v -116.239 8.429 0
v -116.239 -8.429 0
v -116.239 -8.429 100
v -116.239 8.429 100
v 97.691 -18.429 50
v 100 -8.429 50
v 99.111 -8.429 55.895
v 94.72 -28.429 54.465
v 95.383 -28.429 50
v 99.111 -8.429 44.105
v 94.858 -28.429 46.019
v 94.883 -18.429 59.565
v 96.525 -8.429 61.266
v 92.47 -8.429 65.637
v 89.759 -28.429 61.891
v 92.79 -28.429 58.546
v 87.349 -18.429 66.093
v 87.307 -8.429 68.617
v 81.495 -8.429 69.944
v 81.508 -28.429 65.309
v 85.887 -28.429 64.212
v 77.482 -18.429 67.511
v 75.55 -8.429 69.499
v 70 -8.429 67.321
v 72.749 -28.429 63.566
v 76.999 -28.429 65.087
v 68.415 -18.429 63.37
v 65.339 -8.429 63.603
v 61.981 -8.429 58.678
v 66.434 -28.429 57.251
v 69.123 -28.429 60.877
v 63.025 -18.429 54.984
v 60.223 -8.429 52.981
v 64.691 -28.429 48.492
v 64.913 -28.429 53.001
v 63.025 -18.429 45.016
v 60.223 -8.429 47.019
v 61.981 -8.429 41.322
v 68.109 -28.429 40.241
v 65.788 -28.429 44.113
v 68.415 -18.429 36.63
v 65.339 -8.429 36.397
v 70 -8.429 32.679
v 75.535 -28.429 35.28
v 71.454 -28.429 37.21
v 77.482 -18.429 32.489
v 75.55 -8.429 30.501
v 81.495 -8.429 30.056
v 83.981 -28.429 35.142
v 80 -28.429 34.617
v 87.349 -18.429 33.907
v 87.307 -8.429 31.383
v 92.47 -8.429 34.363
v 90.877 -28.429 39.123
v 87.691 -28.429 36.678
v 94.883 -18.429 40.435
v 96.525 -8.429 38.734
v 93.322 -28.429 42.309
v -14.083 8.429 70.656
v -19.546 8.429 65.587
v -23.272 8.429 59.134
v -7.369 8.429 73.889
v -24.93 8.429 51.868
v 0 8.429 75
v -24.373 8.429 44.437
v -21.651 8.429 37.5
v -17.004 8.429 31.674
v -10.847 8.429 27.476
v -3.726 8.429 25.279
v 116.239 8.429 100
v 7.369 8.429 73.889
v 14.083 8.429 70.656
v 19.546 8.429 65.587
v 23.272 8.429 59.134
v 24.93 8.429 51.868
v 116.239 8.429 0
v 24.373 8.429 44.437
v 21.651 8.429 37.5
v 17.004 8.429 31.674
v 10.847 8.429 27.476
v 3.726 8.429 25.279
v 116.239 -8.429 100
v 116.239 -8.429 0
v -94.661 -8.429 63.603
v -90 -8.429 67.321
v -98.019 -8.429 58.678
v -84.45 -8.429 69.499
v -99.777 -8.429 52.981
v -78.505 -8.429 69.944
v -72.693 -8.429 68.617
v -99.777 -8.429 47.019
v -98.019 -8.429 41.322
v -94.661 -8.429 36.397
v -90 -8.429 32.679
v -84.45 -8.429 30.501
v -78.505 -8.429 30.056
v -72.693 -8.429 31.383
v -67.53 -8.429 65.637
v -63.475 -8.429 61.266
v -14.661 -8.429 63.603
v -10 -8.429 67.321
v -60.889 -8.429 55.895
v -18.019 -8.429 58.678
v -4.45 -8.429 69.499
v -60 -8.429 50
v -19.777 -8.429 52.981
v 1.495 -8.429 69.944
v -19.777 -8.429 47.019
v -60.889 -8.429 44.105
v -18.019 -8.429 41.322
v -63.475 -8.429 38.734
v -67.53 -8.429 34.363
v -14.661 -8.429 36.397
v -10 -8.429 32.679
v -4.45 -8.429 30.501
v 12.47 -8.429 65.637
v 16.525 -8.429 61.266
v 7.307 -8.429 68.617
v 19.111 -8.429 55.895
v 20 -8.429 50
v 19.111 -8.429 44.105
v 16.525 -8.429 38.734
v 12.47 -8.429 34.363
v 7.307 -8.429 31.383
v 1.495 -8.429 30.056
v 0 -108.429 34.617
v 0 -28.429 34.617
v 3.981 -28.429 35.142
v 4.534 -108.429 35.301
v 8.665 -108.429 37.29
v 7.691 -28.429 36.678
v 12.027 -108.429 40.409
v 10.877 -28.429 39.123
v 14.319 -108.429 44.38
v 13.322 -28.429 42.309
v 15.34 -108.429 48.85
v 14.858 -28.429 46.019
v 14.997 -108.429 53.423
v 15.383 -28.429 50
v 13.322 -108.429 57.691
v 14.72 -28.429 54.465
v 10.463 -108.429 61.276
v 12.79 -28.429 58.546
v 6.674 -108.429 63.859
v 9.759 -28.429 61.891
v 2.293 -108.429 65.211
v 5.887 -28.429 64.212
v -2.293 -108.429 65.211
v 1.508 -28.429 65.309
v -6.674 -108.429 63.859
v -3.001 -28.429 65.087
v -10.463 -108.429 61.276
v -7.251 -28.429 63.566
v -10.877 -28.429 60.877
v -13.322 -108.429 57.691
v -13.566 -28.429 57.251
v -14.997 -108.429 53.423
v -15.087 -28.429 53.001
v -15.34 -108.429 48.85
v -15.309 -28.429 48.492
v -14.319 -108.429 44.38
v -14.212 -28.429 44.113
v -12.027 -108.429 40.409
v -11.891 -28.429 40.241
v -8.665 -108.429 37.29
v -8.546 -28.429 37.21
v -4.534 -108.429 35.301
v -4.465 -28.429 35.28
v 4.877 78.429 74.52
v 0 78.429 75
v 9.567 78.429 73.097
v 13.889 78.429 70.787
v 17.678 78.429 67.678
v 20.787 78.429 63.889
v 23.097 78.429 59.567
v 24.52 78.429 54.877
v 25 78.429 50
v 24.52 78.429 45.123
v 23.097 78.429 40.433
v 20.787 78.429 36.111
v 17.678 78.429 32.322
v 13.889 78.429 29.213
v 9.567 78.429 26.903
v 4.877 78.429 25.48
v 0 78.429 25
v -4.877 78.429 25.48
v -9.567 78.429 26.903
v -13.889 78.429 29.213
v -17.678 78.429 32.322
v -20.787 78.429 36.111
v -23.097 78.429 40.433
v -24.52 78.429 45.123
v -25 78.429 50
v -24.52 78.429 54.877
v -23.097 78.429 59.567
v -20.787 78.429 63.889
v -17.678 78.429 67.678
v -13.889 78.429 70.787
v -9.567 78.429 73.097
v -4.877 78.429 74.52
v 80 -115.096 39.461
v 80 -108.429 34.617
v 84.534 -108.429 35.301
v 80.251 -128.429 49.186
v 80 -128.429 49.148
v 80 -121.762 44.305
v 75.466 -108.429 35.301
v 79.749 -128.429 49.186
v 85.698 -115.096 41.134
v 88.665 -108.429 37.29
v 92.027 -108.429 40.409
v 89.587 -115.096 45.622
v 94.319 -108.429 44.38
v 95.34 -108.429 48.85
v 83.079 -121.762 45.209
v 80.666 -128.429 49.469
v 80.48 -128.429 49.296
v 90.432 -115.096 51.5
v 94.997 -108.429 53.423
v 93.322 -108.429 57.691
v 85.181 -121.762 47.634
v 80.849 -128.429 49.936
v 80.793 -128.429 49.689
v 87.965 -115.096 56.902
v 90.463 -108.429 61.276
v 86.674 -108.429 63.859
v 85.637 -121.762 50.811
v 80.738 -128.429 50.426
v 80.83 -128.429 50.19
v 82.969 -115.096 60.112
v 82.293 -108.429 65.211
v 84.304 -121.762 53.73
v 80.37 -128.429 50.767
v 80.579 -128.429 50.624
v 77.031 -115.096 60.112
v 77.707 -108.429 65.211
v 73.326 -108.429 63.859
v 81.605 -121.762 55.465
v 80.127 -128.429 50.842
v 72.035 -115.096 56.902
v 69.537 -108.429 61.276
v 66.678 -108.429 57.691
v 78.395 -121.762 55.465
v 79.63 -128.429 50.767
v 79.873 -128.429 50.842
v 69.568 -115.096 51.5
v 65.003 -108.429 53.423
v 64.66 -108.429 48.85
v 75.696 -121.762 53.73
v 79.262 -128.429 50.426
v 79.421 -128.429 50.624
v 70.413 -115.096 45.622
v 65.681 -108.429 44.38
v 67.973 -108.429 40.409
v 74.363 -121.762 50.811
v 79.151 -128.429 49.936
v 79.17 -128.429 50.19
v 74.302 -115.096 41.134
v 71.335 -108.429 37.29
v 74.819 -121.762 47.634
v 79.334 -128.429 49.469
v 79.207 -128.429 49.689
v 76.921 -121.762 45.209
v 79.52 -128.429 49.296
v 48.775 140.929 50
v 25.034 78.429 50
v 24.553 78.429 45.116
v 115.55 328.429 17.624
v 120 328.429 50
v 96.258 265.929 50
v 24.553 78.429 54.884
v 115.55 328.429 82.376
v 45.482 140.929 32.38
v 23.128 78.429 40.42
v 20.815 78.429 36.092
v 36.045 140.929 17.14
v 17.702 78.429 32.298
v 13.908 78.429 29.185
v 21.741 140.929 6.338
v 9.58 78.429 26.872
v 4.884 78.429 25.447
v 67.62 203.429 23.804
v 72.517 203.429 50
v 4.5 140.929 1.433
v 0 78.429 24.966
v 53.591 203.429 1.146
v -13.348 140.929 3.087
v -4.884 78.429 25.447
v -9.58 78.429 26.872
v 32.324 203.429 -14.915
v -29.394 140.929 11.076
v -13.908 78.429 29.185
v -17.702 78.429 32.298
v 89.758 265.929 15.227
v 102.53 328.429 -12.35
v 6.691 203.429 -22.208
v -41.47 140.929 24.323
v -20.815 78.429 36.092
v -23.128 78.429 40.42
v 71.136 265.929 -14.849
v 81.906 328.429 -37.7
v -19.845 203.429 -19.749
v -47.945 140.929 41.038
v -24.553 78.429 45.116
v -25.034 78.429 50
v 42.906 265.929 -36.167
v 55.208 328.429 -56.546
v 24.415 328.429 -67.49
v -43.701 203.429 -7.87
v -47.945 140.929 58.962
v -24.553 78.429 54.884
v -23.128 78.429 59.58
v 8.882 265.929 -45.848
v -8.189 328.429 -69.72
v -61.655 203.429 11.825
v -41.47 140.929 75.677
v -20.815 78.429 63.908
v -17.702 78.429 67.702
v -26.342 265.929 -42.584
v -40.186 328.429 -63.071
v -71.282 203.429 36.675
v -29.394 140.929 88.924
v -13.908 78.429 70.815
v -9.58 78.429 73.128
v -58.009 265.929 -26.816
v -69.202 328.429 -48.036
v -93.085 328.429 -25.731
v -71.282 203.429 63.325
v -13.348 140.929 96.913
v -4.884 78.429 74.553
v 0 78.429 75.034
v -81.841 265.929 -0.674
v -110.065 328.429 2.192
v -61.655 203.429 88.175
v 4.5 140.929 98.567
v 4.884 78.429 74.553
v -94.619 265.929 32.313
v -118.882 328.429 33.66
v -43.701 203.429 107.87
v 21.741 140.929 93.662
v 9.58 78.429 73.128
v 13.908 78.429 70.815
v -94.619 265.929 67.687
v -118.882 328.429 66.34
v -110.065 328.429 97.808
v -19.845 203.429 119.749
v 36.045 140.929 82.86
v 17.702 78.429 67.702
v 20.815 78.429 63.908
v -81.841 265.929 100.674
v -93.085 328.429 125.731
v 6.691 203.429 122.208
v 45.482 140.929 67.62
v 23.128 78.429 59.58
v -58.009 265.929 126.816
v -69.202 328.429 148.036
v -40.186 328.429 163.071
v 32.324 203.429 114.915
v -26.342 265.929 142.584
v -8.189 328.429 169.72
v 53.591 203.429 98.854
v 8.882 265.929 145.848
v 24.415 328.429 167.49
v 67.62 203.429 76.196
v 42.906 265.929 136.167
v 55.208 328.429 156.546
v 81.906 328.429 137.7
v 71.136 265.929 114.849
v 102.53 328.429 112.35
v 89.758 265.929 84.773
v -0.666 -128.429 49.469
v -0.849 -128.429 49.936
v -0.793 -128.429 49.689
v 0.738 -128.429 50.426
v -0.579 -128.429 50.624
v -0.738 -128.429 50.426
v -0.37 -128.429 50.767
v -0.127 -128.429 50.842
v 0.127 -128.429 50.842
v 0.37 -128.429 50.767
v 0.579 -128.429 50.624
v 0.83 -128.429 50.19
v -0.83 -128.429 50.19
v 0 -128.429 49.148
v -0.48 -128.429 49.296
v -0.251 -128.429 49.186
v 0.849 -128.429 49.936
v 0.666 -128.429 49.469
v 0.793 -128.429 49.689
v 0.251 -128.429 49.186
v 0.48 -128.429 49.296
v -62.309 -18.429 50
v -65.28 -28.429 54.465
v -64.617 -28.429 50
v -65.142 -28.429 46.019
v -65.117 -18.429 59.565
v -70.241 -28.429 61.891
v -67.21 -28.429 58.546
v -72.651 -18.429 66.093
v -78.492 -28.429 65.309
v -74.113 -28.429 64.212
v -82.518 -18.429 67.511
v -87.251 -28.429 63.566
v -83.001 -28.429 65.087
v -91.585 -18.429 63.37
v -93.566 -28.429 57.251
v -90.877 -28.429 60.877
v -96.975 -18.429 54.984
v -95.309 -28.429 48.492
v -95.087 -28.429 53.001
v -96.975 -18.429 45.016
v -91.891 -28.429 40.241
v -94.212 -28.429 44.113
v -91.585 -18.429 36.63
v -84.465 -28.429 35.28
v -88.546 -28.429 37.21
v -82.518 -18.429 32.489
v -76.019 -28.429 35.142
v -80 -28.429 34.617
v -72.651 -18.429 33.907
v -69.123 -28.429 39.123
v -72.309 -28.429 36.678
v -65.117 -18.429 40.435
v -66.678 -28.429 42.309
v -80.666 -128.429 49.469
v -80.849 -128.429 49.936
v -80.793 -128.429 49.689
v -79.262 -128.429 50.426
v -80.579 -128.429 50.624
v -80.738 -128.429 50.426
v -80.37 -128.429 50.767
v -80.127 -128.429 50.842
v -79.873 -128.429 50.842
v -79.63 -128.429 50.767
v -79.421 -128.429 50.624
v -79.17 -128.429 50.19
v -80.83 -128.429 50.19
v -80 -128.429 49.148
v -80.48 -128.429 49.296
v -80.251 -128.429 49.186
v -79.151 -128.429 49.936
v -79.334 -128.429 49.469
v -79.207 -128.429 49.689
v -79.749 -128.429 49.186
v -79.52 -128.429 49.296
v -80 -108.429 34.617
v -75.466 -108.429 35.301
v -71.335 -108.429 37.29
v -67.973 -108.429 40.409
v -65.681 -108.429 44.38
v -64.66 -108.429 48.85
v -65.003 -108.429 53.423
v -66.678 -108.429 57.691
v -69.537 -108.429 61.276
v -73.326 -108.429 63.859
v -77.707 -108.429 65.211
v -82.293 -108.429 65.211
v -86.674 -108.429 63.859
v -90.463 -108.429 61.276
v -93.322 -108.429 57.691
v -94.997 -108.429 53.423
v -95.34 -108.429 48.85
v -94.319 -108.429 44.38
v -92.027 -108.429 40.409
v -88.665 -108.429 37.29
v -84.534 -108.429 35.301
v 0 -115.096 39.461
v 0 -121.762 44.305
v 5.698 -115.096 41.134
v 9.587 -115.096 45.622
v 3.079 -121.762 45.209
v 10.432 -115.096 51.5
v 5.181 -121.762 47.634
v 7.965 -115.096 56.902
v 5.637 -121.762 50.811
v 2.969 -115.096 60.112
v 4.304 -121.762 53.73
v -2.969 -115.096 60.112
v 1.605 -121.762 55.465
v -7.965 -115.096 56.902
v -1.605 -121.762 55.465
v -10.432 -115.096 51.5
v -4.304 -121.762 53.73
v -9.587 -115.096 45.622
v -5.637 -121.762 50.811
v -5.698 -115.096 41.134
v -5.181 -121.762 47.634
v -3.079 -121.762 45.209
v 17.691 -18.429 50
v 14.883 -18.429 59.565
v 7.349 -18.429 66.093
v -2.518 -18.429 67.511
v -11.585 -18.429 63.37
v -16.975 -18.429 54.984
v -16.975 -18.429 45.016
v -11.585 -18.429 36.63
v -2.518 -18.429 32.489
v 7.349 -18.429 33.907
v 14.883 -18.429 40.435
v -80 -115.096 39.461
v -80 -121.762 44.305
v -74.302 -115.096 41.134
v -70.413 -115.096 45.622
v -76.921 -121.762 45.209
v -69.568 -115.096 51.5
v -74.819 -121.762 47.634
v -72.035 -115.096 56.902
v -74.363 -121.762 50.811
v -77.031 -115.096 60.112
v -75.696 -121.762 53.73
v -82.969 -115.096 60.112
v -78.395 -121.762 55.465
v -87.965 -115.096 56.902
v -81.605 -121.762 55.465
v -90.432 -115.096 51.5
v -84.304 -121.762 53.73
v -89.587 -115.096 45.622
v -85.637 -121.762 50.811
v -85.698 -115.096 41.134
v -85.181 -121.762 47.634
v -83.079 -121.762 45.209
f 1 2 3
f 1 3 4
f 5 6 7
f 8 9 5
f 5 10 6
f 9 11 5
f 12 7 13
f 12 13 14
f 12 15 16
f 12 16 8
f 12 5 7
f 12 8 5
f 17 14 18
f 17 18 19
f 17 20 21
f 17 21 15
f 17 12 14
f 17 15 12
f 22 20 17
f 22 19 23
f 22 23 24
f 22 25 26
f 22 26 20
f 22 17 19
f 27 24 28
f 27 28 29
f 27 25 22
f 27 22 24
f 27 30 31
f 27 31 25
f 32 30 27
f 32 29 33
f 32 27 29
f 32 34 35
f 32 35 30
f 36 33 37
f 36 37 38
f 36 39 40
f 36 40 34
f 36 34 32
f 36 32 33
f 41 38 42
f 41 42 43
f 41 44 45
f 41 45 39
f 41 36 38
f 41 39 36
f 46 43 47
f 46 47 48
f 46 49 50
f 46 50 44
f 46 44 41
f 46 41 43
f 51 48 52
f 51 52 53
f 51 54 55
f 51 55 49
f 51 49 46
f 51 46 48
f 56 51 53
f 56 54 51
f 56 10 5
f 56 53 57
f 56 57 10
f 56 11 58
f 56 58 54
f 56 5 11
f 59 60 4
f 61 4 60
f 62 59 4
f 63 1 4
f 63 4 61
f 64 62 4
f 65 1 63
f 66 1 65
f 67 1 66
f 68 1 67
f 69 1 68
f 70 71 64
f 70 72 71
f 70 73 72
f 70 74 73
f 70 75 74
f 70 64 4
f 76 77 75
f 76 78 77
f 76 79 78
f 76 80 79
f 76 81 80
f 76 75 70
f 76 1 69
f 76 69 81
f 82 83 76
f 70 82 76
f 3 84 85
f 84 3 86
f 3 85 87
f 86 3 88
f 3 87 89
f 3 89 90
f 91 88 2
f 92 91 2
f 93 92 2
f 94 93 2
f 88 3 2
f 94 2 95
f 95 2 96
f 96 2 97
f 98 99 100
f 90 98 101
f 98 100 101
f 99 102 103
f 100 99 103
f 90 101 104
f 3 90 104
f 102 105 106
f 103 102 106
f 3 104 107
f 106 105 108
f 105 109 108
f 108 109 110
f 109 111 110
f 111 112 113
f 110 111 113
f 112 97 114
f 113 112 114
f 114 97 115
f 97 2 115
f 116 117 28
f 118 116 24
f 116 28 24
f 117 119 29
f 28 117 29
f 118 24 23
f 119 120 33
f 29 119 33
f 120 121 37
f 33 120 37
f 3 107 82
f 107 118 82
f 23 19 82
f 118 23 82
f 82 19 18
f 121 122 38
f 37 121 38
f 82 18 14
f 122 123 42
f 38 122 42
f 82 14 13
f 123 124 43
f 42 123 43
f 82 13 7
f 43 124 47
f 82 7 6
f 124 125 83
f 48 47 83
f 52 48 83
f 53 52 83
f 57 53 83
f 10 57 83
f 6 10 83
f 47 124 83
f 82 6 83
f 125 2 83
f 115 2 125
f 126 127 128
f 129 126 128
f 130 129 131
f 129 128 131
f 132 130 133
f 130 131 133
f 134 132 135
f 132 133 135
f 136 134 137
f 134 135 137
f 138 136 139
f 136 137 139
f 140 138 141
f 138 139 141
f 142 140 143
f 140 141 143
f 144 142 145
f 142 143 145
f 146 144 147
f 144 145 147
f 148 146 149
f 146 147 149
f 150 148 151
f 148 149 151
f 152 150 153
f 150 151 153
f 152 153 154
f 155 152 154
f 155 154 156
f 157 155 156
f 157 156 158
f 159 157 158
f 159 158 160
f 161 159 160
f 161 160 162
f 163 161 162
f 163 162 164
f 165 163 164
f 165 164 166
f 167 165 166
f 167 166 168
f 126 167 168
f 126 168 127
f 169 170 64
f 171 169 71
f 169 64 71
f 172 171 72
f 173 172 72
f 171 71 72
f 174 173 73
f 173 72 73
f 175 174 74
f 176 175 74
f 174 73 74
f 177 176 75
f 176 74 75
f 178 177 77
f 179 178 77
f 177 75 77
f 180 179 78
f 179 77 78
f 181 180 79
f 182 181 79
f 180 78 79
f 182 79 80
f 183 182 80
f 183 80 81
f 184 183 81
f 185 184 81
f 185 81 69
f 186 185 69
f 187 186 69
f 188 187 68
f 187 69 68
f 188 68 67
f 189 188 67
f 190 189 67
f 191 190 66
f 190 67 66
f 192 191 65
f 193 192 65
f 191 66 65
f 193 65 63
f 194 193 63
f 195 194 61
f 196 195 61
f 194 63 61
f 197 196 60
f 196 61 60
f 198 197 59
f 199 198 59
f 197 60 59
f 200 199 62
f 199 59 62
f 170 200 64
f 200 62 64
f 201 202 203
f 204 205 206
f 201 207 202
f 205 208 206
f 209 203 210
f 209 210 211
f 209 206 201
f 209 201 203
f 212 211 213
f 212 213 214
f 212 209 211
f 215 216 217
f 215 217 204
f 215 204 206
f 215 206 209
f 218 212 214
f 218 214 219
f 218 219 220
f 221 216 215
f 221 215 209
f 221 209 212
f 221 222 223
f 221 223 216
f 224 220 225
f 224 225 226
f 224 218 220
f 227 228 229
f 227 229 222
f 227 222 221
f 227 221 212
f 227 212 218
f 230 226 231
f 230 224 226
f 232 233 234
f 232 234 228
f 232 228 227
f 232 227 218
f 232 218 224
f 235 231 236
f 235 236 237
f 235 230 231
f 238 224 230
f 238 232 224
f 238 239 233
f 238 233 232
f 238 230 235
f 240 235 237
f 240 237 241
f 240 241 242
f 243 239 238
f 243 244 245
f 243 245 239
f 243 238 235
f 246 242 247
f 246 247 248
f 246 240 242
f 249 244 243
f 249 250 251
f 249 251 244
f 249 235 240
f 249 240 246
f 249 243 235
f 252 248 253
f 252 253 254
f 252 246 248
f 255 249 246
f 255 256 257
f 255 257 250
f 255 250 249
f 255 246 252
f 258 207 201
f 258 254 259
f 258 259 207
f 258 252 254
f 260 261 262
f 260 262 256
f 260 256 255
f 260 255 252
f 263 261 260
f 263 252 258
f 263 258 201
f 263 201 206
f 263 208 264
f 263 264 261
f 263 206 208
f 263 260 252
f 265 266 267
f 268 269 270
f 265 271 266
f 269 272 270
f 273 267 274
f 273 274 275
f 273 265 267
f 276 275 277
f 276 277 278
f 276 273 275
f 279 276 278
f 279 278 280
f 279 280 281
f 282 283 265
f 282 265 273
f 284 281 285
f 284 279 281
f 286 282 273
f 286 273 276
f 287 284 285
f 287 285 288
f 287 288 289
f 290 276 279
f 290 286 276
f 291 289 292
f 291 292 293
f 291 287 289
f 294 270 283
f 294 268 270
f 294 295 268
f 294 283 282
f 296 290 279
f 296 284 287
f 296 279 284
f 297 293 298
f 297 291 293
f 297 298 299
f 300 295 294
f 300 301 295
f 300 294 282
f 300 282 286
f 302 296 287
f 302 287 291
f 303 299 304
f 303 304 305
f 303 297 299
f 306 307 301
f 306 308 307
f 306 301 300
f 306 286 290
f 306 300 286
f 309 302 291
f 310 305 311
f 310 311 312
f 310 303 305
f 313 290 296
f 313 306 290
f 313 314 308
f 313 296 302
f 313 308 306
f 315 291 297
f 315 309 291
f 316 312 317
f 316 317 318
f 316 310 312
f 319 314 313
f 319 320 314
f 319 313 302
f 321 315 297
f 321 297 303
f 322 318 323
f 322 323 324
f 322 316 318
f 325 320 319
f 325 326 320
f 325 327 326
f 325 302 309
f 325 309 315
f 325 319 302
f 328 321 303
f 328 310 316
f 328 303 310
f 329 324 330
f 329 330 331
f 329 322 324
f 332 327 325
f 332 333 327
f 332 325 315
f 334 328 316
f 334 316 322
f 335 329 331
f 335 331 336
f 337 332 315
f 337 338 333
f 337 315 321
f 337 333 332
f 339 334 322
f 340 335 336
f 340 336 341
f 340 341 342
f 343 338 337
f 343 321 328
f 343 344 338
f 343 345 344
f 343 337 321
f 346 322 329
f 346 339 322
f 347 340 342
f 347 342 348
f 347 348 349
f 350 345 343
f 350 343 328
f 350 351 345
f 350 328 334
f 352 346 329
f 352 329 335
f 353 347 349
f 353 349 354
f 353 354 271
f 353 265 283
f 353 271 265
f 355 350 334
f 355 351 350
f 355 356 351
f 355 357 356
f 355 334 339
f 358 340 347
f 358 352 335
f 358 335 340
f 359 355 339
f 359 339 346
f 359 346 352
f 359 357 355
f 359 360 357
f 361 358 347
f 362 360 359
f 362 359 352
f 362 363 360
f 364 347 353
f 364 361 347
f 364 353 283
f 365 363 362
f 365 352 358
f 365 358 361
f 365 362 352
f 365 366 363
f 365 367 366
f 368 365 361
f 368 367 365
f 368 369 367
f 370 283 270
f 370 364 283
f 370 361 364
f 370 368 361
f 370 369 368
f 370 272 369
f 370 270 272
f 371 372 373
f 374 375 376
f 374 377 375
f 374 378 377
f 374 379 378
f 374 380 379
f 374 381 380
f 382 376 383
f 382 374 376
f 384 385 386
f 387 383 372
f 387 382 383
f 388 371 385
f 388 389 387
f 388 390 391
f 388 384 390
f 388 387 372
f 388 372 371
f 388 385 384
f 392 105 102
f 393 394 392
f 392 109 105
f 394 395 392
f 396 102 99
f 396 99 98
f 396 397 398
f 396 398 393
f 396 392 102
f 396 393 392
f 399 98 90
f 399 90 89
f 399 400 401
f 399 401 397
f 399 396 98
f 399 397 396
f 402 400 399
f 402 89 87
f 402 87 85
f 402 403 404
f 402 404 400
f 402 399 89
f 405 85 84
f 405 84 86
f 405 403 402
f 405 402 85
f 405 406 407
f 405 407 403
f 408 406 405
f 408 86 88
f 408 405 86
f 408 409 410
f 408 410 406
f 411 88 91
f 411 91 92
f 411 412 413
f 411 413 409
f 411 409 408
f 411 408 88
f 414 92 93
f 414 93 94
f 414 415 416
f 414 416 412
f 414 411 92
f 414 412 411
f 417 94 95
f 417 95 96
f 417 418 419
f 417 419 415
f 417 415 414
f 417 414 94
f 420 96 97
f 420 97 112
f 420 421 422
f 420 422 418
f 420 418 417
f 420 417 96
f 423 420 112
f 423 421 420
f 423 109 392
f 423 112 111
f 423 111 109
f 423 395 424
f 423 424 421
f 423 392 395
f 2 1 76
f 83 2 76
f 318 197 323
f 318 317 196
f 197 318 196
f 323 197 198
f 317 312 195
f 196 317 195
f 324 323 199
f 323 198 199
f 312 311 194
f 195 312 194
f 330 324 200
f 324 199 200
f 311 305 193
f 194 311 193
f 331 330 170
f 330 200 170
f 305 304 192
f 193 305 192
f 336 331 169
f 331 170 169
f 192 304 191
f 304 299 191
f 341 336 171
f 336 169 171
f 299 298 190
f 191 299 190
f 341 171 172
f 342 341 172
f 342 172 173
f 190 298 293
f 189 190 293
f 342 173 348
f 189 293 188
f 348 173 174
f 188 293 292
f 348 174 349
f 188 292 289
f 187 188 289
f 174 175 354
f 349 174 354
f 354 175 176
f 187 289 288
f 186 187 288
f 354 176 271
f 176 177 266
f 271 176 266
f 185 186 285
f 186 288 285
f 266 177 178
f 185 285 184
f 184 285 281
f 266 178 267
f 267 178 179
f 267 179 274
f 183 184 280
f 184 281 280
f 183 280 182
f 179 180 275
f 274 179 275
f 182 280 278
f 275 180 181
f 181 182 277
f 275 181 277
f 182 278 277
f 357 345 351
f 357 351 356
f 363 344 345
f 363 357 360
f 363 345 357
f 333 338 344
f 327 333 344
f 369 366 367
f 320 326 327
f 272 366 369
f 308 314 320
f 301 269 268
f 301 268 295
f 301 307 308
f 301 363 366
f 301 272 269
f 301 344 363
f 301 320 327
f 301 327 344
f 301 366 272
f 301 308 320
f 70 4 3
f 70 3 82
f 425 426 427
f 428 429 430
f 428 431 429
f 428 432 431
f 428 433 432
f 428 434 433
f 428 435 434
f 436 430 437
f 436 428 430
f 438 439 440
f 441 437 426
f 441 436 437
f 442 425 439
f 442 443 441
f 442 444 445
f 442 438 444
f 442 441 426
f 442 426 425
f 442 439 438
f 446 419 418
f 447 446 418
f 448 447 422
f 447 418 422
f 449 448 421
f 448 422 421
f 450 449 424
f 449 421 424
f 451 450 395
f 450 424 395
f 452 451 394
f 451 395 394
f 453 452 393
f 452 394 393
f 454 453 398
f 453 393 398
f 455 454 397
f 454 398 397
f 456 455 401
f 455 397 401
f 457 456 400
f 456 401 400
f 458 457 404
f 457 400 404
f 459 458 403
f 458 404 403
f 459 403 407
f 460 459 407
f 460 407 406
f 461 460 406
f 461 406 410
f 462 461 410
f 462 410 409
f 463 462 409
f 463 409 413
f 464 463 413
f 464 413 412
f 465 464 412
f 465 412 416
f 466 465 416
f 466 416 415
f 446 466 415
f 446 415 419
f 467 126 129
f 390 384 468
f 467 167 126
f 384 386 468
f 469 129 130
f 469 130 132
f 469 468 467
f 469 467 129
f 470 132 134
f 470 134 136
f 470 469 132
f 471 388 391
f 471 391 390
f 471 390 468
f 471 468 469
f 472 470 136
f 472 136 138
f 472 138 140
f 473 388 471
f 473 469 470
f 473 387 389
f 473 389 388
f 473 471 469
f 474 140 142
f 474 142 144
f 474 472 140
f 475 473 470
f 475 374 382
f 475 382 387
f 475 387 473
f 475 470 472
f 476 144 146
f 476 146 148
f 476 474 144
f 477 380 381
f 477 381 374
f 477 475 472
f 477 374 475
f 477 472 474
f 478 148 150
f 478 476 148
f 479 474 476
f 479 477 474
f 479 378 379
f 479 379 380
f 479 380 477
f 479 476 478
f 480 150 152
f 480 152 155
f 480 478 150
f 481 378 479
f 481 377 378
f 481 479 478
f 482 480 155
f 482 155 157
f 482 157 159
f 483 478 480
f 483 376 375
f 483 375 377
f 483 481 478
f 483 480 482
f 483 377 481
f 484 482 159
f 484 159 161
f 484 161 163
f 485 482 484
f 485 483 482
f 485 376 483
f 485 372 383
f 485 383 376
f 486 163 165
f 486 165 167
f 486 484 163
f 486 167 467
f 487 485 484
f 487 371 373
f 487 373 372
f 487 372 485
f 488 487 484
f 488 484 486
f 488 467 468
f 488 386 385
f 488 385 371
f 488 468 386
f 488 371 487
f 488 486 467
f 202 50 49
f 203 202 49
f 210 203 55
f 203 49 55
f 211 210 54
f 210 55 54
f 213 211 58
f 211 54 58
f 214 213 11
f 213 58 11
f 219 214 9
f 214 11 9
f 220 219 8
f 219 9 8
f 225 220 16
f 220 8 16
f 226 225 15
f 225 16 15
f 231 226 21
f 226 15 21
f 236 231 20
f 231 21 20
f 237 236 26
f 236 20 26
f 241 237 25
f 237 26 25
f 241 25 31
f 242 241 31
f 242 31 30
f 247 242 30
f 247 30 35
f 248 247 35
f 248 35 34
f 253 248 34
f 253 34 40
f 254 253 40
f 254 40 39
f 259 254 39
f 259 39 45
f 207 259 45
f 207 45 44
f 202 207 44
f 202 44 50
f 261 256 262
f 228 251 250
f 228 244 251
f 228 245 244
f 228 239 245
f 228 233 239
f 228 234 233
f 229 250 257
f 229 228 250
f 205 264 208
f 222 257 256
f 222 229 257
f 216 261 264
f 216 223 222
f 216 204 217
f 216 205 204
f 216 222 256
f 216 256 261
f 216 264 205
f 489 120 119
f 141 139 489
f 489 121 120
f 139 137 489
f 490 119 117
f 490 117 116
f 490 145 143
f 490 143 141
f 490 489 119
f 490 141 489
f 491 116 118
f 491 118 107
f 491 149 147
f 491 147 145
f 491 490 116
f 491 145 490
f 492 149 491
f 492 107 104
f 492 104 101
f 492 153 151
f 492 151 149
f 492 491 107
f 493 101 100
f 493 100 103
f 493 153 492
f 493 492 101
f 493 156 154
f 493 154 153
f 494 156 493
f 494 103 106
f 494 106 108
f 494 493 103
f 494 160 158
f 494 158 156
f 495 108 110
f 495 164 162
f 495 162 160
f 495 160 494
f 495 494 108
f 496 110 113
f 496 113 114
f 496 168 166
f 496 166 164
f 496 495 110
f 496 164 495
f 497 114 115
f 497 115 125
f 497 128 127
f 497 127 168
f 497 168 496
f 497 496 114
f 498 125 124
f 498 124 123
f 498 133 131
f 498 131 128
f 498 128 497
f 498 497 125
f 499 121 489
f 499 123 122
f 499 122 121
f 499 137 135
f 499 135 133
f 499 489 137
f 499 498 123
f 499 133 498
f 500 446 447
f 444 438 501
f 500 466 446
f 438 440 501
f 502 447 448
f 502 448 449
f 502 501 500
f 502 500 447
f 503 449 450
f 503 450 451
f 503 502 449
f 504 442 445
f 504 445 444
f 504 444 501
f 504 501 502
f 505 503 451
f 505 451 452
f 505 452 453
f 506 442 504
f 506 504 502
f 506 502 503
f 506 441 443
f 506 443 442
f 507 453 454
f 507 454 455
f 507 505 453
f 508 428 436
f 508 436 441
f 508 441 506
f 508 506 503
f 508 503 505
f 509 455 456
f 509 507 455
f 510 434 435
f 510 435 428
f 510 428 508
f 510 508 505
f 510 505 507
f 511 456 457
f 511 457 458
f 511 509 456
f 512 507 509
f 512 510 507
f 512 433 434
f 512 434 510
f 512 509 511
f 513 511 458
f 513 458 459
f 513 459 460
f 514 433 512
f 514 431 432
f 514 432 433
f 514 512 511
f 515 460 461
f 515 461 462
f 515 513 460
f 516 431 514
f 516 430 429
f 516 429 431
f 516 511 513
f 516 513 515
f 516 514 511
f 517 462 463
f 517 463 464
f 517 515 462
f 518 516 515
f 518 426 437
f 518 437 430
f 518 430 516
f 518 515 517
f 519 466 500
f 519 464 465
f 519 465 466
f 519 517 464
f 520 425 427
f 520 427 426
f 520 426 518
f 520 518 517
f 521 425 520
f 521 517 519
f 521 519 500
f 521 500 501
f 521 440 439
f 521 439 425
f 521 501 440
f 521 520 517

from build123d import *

# Parameters (mm, degrees)
SKETCH1_W           = 232.477284974
SKETCH1_H           = 16.858001952
BOSS_EXTRUDE1_DEPTH = 100
SKETCH2_R           = 25
BOSS_EXTRUDE2_DEPTH = 70
SKETCH5_R           = 20
BOSS_EXTRUDE3_DEPTH = 20
BOSS_EXTRUDE3_TAPER = 13
SKETCH6_R           = 15.382636177
BOSS_EXTRUDE4_DEPTH = 80
SKETCH7_R           = 15.382636177
BOSS_EXTRUDE5_DEPTH = 20
BOSS_EXTRUDE5_TAPER = 36
LPATTERN1_COUNT     = 2
LPATTERN1_PITCH     = 80
LPATTERN2_COUNT     = 2
LPATTERN2_PITCH     = 80
SKETCH9_R           = 120
BOSS_EXTRUDE6_DEPTH = 250
BOSS_EXTRUDE6_DRAFT = -20.8


with BuildPart() as part:
    # Sketch1 → Boss-Extrude1 (new body)
    with BuildSketch(Plane.XY):
        Rectangle(SKETCH1_W, SKETCH1_H)
    extrude(amount=BOSS_EXTRUDE1_DEPTH)

    # Sketch2 → Boss-Extrude2 (add)
    with BuildSketch(Plane(origin=(0, 8.429000976, 0), x_dir=(1, 0, 0), z_dir=(0, 1, 0))):
        with Locations(Location((0, -50, 0), (0, 0, 270))):
            Circle(SKETCH2_R)
    extrude(amount=BOSS_EXTRUDE2_DEPTH)

    # Sketch5 → Boss-Extrude3 (add)
    with BuildSketch(Plane.XZ.offset(8.429000976)):
        with Locations((0, 50)):
            Circle(SKETCH5_R)
    boss_extrude3 = extrude(amount=BOSS_EXTRUDE3_DEPTH, taper=BOSS_EXTRUDE3_TAPER)

    # Sketch6 → Boss-Extrude4 (add)
    with BuildSketch(Plane.XZ.offset(28.429000976)):
        with Locations(Location((0, 50, 0), (0, 0, 270))):
            Circle(SKETCH6_R)
    boss_extrude4 = extrude(amount=BOSS_EXTRUDE4_DEPTH)

    # Sketch7 → Boss-Extrude5 (add)
    with BuildSketch(Plane.XZ.offset(108.429000976)):
        with Locations(Location((0, 50, 0), (0, 0, 270))):
            Circle(SKETCH7_R)
    boss_extrude5 = extrude(amount=BOSS_EXTRUDE5_DEPTH, taper=BOSS_EXTRUDE5_TAPER)

    # LPattern1: Boss-Extrude3, Boss-Extrude4, Boss-Extrude5 ×2
    with Locations(*[(i * LPATTERN1_PITCH, 0, 0) for i in range(1, LPATTERN1_COUNT)]):
        add(boss_extrude3)
        add(boss_extrude4)
        add(boss_extrude5)

    # LPattern2: Boss-Extrude3, Boss-Extrude4, Boss-Extrude5 ×2
    with Locations(*[(-i * LPATTERN2_PITCH, 0, 0) for i in range(1, LPATTERN2_COUNT)]):
        add(boss_extrude3)
        add(boss_extrude4)
        add(boss_extrude5)


with BuildPart() as boss_extrude6_tool:
    # Sketch9 → Boss-Extrude6 (with draft: the straight prism first)
    with BuildSketch(Plane(origin=(0, 328.429000976, 0), x_dir=(1, 0, 0), z_dir=(0, 1, 0))):
        with Locations((0, -50)):
            Circle(SKETCH9_R)
    extrude(amount=-BOSS_EXTRUDE6_DEPTH)
    # Boss-Extrude6: the draft: its side faces are tilted about the plane it starts from
    boss_extrude6_sides = [boss_extrude6_tool.faces().sort_by_distance(p)[0] for p in [
        (-120, 203.429000976, 50),
    ]]
    draft(boss_extrude6_sides, Plane(origin=(0, 328.429000976, 0), x_dir=(1, 0, 0), z_dir=(0, 1, 0)), BOSS_EXTRUDE6_DRAFT)


with BuildPart() as part_1:
    add(part.part)

    # Boss-Extrude6: add boss_extrude6_tool
    add(boss_extrude6_tool.part)


solid = part_1.part
